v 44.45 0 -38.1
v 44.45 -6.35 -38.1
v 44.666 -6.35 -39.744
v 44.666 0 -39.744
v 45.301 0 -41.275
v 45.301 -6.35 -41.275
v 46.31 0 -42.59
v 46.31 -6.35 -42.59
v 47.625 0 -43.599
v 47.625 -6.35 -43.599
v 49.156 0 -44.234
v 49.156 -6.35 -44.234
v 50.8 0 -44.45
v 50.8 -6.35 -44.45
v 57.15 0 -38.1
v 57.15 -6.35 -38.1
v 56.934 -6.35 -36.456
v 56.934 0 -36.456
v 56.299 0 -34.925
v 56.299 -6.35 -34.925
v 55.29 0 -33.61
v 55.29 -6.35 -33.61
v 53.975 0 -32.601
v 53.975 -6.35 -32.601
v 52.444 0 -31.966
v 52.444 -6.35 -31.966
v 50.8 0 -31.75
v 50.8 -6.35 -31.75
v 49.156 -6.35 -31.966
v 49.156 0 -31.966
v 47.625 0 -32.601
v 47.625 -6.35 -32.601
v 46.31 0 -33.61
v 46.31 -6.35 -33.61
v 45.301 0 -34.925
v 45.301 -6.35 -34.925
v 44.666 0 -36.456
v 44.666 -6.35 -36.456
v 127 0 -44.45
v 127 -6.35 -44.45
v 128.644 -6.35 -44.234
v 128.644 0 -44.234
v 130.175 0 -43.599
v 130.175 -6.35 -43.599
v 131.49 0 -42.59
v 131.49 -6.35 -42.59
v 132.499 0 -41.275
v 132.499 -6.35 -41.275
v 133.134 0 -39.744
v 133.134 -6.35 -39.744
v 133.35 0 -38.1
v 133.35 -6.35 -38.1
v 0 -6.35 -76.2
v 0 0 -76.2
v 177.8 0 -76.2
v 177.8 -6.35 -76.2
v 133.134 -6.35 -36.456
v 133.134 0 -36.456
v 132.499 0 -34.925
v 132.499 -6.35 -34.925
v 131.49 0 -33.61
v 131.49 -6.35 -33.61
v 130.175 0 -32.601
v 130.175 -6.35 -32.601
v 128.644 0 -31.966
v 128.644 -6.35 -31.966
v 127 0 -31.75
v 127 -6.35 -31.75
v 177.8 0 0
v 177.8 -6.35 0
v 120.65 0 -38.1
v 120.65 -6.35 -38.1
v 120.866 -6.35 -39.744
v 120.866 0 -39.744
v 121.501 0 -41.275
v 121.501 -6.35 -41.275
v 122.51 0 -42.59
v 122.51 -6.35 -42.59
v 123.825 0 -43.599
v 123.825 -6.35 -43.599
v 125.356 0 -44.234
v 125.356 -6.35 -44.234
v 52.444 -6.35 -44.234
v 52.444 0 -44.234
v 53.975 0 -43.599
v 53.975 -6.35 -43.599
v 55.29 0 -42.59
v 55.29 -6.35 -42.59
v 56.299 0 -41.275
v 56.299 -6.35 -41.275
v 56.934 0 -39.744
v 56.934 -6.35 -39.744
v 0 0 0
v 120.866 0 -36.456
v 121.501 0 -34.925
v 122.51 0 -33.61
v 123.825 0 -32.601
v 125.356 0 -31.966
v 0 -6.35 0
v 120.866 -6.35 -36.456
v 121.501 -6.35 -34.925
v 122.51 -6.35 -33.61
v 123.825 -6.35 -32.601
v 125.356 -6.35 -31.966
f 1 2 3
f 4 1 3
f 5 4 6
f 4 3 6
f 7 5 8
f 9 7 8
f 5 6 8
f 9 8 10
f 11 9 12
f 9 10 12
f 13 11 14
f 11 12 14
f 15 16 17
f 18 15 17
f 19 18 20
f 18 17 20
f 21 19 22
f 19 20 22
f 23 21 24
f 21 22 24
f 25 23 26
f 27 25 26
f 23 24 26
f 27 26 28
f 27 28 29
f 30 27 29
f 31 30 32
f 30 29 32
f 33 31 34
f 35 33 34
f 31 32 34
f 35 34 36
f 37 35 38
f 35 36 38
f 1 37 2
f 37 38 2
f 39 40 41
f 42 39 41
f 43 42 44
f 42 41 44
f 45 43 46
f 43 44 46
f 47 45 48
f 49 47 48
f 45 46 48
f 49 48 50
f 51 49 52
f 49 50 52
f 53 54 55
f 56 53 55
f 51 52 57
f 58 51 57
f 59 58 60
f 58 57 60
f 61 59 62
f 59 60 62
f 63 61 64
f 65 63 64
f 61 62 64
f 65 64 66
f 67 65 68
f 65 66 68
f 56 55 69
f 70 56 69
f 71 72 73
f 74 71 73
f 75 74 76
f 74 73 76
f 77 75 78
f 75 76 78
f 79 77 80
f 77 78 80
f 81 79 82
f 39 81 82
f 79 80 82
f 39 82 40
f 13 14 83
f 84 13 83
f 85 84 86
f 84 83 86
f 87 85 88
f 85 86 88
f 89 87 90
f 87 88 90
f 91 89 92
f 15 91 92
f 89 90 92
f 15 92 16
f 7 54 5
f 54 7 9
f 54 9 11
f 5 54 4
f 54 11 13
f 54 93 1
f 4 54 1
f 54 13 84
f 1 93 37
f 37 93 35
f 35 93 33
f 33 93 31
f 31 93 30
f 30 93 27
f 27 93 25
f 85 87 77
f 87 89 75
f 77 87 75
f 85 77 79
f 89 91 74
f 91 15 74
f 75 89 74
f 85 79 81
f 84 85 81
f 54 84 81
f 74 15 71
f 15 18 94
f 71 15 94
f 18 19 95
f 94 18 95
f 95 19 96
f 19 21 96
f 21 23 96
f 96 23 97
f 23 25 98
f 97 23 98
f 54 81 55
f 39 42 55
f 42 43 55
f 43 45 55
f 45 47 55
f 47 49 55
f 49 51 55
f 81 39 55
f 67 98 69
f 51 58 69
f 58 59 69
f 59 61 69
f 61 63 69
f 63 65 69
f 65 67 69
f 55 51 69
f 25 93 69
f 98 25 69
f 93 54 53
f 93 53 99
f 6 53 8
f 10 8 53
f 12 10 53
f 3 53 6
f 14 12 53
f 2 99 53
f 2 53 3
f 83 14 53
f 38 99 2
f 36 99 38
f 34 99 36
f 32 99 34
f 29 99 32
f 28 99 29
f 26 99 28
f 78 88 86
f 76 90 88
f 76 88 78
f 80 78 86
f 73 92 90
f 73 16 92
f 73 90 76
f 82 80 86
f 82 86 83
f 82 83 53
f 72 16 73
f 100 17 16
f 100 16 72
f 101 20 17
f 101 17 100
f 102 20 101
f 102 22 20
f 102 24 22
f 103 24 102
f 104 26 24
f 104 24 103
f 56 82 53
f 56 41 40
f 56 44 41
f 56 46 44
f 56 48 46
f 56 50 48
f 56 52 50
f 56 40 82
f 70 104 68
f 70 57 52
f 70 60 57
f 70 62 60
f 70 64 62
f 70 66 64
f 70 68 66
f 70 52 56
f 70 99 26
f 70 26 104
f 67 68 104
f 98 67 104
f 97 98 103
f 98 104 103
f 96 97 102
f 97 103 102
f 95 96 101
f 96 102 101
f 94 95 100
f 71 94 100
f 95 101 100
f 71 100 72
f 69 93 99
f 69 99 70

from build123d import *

# Parameters (mm, degrees)
F0_W     = 177.8
F0_H     = 76.2
F1_DEPTH = 6.35
F3_DEPTH = 6.351


with BuildPart() as f1:
    # F0 (on Front) → F1 (new body)
    with BuildSketch(Plane.XZ):
        with Locations((88.9, -38.1)):
            Rectangle(F0_W, F0_H)
    extrude(amount=F1_DEPTH)

    # F2 (on face) → F3 (cut, through all)
    with BuildSketch(Plane.XZ.offset(6.35)):
        with BuildLine():
            ThreePointArc((50.8, -31.75), (46.309872, -33.609872), (44.45, -38.1))
            Line((44.45, -38.1), (50.8, -38.1))
            Line((50.8, -38.1), (50.8, -31.75))
        make_face()
        with BuildLine():
            ThreePointArc((127, -31.75), (122.509872, -33.609872), (120.65, -38.1))
            Line((120.65, -38.1), (127, -38.1))
            Line((127, -38.1), (127, -31.75))
        make_face()
        with BuildLine():
            Line((127, -38.1), (120.65, -38.1))
            ThreePointArc((120.65, -38.1), (122.509872, -42.590128), (127, -44.45))
            Line((127, -44.45), (127, -38.1))
        make_face()
        with BuildLine():
            Line((50.8, -38.1), (44.45, -38.1))
            ThreePointArc((44.45, -38.1), (46.309872, -42.590128), (50.8, -44.45))
            Line((50.8, -44.45), (50.8, -38.1))
        make_face()
        with BuildLine():
            Line((50.8, -31.75), (50.8, -38.1))
            Line((50.8, -38.1), (57.15, -38.1))
            ThreePointArc((57.15, -38.1), (55.290128, -33.609872), (50.8, -31.75))
        make_face()
        with BuildLine():
            Line((57.15, -38.1), (50.8, -38.1))
            Line((50.8, -38.1), (50.8, -44.45))
            ThreePointArc((50.8, -44.45), (55.290128, -42.590128), (57.15, -38.1))
        make_face()
        with BuildLine():
            Line((127, -31.75), (127, -38.1))
            Line((127, -38.1), (133.35, -38.1))
            ThreePointArc((133.35, -38.1), (131.490128, -33.609872), (127, -31.75))
        make_face()
        with BuildLine():
            Line((133.35, -38.1), (127, -38.1))
            Line((127, -38.1), (127, -44.45))
            ThreePointArc((127, -44.45), (131.490128, -42.590128), (133.35, -38.1))
        make_face()
    extrude(amount=-F3_DEPTH, mode=Mode.SUBTRACT)


solid = f1.part
